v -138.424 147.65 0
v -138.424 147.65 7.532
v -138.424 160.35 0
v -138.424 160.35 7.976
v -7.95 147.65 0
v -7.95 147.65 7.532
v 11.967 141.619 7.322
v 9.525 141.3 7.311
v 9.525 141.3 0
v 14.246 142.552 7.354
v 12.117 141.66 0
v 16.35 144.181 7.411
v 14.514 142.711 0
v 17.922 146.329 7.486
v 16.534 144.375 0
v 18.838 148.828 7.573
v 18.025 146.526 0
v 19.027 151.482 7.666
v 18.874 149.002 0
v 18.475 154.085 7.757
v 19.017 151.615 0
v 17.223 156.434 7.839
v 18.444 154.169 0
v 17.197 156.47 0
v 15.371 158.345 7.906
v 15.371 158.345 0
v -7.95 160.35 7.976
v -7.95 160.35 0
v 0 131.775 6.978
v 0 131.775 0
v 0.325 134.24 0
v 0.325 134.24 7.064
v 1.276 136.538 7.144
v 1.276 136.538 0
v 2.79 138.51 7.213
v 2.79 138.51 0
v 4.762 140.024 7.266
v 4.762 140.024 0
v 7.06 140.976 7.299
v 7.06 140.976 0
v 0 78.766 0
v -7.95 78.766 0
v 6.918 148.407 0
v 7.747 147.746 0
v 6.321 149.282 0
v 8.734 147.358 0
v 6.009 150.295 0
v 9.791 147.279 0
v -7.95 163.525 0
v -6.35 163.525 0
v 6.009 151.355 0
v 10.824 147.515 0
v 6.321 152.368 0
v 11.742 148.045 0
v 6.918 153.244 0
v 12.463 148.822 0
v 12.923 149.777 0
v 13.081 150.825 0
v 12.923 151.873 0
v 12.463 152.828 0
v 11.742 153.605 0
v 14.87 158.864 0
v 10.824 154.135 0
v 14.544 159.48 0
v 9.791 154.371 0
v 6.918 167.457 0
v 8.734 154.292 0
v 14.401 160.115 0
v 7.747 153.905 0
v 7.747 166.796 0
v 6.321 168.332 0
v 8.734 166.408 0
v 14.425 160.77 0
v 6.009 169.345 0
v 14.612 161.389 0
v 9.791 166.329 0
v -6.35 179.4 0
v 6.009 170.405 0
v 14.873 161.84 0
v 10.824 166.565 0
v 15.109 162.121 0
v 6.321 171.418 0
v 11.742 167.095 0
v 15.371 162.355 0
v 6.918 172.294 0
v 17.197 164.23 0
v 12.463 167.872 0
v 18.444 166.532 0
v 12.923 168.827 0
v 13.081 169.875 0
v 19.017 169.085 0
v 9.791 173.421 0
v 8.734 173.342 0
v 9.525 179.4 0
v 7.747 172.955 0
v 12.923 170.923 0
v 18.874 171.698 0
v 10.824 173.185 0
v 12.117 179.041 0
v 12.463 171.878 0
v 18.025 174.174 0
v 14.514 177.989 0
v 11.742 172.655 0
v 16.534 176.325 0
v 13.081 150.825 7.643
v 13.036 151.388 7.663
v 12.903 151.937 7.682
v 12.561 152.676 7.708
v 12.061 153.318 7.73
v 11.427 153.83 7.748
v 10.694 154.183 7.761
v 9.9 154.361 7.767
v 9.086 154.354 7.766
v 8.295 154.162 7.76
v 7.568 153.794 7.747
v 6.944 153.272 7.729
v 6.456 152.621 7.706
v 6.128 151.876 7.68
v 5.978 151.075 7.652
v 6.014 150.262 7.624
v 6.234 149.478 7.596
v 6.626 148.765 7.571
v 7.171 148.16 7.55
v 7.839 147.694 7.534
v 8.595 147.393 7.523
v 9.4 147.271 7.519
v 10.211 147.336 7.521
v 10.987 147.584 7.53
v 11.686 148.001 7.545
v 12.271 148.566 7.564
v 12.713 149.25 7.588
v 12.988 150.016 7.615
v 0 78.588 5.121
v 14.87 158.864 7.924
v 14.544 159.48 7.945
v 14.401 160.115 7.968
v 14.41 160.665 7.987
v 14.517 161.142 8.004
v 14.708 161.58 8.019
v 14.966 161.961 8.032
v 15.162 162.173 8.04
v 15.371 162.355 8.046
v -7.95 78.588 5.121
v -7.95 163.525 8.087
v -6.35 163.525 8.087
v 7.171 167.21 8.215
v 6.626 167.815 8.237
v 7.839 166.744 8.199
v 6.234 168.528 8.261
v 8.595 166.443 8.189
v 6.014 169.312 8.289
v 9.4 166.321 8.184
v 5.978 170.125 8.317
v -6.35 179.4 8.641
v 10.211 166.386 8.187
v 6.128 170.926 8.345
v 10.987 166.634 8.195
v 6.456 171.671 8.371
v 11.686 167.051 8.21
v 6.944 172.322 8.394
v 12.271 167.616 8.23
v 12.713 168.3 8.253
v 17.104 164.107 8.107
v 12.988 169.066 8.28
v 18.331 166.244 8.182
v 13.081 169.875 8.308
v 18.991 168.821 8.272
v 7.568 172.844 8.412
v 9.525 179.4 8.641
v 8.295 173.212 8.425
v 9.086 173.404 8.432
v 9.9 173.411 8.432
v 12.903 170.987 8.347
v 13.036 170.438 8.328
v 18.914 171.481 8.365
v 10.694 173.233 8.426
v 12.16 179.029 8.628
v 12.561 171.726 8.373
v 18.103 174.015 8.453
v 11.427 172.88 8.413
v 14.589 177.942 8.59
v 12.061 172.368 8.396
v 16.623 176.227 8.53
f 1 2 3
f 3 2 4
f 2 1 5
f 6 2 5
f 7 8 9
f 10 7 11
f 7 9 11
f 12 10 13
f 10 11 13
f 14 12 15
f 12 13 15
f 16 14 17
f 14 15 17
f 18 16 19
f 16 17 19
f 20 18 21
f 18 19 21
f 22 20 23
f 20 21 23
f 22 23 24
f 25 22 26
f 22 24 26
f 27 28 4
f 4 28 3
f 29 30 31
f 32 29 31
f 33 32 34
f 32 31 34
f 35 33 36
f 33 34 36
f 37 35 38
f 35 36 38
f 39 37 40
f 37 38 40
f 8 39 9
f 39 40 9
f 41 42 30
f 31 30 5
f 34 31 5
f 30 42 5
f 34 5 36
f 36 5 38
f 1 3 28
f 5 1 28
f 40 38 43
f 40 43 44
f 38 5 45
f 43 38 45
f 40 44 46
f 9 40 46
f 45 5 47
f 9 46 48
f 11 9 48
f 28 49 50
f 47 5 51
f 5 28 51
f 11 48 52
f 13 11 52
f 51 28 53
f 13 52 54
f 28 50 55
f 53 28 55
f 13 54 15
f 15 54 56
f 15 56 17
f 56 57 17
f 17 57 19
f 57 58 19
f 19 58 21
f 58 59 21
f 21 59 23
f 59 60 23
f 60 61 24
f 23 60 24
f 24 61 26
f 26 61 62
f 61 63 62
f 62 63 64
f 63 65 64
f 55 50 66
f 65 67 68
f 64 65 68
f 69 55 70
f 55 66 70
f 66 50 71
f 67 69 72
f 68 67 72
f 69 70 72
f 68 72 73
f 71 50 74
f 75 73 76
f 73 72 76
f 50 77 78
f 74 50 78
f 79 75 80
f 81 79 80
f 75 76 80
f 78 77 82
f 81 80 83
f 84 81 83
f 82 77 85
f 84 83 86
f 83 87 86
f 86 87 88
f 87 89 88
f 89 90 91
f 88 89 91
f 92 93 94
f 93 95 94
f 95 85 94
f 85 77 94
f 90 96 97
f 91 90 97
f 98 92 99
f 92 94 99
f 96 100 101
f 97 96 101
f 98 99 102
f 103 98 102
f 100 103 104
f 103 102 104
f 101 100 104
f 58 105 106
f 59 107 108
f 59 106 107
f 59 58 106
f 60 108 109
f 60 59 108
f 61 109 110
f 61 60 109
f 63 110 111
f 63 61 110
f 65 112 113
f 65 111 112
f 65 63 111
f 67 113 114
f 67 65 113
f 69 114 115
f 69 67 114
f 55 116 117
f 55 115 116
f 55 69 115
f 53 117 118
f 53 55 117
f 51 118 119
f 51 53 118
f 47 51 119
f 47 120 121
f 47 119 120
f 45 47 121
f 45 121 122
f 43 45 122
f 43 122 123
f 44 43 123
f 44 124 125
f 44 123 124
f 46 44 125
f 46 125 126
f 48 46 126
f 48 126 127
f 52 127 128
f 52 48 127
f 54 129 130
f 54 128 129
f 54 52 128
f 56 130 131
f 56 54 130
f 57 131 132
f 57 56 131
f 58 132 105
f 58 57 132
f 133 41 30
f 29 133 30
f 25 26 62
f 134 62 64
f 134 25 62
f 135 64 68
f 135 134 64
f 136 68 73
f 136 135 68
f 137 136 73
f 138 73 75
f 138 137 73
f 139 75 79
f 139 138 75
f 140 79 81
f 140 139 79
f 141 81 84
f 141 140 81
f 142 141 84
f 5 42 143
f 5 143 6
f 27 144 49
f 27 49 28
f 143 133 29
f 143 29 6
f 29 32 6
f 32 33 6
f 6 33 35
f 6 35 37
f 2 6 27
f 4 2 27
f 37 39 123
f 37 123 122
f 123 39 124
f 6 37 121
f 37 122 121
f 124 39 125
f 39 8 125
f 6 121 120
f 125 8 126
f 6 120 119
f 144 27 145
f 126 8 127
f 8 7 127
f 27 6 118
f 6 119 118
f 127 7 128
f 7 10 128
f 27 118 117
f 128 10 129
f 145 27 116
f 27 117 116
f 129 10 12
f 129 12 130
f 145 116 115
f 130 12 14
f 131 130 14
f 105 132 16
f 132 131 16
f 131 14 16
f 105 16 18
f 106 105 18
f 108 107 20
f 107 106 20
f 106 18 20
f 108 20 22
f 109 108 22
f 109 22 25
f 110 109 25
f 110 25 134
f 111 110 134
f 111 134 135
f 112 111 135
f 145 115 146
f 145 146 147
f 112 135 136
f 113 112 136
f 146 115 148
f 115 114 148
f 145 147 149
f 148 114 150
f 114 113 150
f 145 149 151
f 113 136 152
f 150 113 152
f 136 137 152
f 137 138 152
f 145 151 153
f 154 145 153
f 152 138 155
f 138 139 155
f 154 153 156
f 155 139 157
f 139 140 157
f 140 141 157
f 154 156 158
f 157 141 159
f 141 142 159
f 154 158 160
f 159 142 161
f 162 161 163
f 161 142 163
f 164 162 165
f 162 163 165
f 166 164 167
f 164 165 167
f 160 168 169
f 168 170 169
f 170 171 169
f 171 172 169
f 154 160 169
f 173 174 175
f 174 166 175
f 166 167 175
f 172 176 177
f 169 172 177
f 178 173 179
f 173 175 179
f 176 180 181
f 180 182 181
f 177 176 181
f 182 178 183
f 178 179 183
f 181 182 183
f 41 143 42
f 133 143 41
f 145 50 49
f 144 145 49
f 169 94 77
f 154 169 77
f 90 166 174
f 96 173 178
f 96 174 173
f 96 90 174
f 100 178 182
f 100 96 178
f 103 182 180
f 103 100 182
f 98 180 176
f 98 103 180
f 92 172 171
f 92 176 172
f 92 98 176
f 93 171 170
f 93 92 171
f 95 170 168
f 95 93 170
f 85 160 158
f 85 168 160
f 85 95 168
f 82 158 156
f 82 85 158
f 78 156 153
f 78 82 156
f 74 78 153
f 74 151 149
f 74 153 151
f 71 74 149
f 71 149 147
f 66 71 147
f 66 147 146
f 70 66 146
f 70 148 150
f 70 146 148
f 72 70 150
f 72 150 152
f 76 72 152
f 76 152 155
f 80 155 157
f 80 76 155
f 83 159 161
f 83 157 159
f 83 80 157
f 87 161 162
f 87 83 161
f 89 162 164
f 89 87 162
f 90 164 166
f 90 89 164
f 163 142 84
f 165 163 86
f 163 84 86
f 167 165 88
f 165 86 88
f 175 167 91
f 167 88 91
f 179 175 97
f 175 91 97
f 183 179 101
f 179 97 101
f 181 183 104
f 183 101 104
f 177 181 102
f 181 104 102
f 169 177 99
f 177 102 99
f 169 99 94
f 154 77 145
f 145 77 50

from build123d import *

# Parameters (mm, degrees)
BOSS_EXTRUDE1_OUTLINE_R = 3.556
BOSS_EXTRUDE1_OUTLINE_W = 260.9469
BOSS_EXTRUDE1_OUTLINE_H = 138.1252
BOSS_EXTRUDE1_DEPTH     = 76.2
CUT_EXTRUDE1_DEPTH      = 355.32482824
CUT_EXTRUDE1_DEPTH_BACK = 355.32482824
FILLET1_R               = 2.54
SKETCH7_W               = 260.9469
SKETCH7_H               = 22.1996
CUT_EXTRUDE2_DEPTH      = 347.152897849
FILLET2_R               = 6.35
SKETCH8_W               = 190.775627824
SKETCH8_H               = 235.521960295
CUT_EXTRUDE4_DEPTH      = 347.144751077
SKETCH9_W               = 165.75862987
SKETCH9_H               = 108.368614936
CUT_EXTRUDE5_DEPTH      = 227.747805823


# Read off the part's stored shape, not the designer's step: Boss-Extrude1
with BuildPart() as part:
    # Boss-Extrude1 outline → Boss-Extrude1 (new body)
    with BuildSketch(Plane.XY):
        with BuildLine():
            Line((-286.3596, -22.225), (9.525, -22.225))
            ThreePointArc((9.525, -22.225), (19.05, -12.7), (9.525, -3.175))
            ThreePointArc((9.525, -3.175), (19.05, 6.35), (9.525, 15.875))
            ThreePointArc((9.525, 15.875), (2.789807909, 18.664807909), (0, 25.4))
            Line((0, 25.4), (0, 131.7752))
            ThreePointArc((0, 131.7752), (2.789807909, 138.510392091), (9.525, 141.3002))
            ThreePointArc((9.525, 141.3002), (19.05, 150.8252), (9.525, 160.3502))
            ThreePointArc((9.525, 160.3502), (19.05, 169.8752), (9.525, 179.4002))
            Line((9.525, 179.4002), (-6.35, 179.4002))
            Line((-6.35, 179.4002), (-6.35, 163.5252))
            Line((-6.35, 163.5252), (-7.9502, 163.5252))
            Line((-7.9502, 163.5252), (-7.9502, 160.3502))
            Line((-7.9502, 160.3502), (-268.9098, 160.3502))
            Line((-268.9098, 160.3502), (-268.9098, 163.5252))
            Line((-268.9098, 163.5252), (-270.51, 163.5252))
            Line((-270.51, 163.5252), (-270.51, 179.4002))
            Line((-270.51, 179.4002), (-286.385, 179.4002))
            ThreePointArc((-286.385, 179.4002), (-295.91, 169.8752), (-286.385, 160.3502))
            ThreePointArc((-286.385, 160.3502), (-295.897297883, 150.818850004), (-286.3723, 141.3002))
            ThreePointArc((-286.3723, 141.3002), (-279.637107909, 138.510392091), (-276.8473, 131.7752))
            Line((-276.8473, 131.7752), (-276.8473, 25.4))
            ThreePointArc((-276.8473, 25.4), (-279.637107909, 18.664807909), (-286.3723, 15.875))
            ThreePointArc((-286.3723, 15.875), (-295.8973, 6.35), (-286.3723, -3.175))
            ThreePointArc((-286.3723, -3.175), (-295.884597883, -12.706349996), (-286.3596, -22.225))
        make_face()
        with Locations((-286.3596, -12.7)):
            Circle(BOSS_EXTRUDE1_OUTLINE_R, mode=Mode.SUBTRACT)
        with Locations((-286.3723, 6.35)):
            Circle(BOSS_EXTRUDE1_OUTLINE_R, mode=Mode.SUBTRACT)
        with Locations((9.525, -12.7)):
            Circle(BOSS_EXTRUDE1_OUTLINE_R, mode=Mode.SUBTRACT)
        with Locations((9.525, 6.35)):
            Circle(BOSS_EXTRUDE1_OUTLINE_R, mode=Mode.SUBTRACT)
        with Locations((-286.3723, 150.8252)):
            Circle(BOSS_EXTRUDE1_OUTLINE_R, mode=Mode.SUBTRACT)
        with Locations((-286.385, 169.8752)):
            Circle(BOSS_EXTRUDE1_OUTLINE_R, mode=Mode.SUBTRACT)
        with Locations((-138.42365, 78.5876)):
            Rectangle(BOSS_EXTRUDE1_OUTLINE_W, BOSS_EXTRUDE1_OUTLINE_H, mode=Mode.SUBTRACT)
        with Locations((9.525, 150.8252)):
            Circle(BOSS_EXTRUDE1_OUTLINE_R, mode=Mode.SUBTRACT)
        with Locations((9.525, 169.8752)):
            Circle(BOSS_EXTRUDE1_OUTLINE_R, mode=Mode.SUBTRACT)
    extrude(amount=BOSS_EXTRUDE1_DEPTH)

    # Sketch5 → Cut-Extrude1 (cut, two sides: drawn at the far end of the back side and taken through both)
    with BuildSketch(Plane.ZY.offset(276.8473).offset(-CUT_EXTRUDE1_DEPTH_BACK)):
        Polygon((1.6002, -22.225), (8.641107133, 179.4002), (76.2, 179.4002), (76.2, -22.225), align=None)
    extrude(amount=CUT_EXTRUDE1_DEPTH + CUT_EXTRUDE1_DEPTH_BACK, mode=Mode.SUBTRACT)

    # Fillet1
    fillet1_edges = [part.edges().sort_by_distance(p)[0] for p in [
        (-286.385, 160.3502, 3.987933237),
        (-286.3723, -3.175, 1.132720329),
        (9.525, -3.175, 1.132720329),
        (9.525, 160.3502, 3.987933237),
    ]]
    fillet(fillet1_edges, radius=FILLET1_R)

    # Sketch7 → Cut-Extrude2 (cut, through all)
    with BuildSketch(Plane(origin=(0, 0, 0), x_dir=(-1, 0, 0), z_dir=(0, 0, -1))):
        with Locations((138.42365, -6.35)):
            Rectangle(SKETCH7_W, SKETCH7_H)
    extrude(amount=-CUT_EXTRUDE2_DEPTH, mode=Mode.SUBTRACT)

    # Fillet2
    fillet2_edges = [part.edges().sort_by_distance(p)[0] for p in [
        (-268.8971, 4.7498, 1.271090386),
        (-268.8971, -17.4498, 0.883476829),
        (-7.9502, -17.4498, 0.883476829),
        (-7.9502, 4.7498, 1.271090386),
    ]]
    fillet(fillet2_edges, radius=FILLET2_R)

    # Sketch8 → Cut-Extrude4 (cut, through all)
    with BuildSketch(Plane(origin=(0, -0.082881646, 2.373419811), x_dir=(1, 0, 0), z_dir=(0, -0.03489949670250444, 0.9993908270190958))):
        with Locations((-233.811463912, 74.917246318)):
            Rectangle(SKETCH8_W, SKETCH8_H)
    extrude(amount=-CUT_EXTRUDE4_DEPTH, mode=Mode.SUBTRACT)

    # Sketch9 → Cut-Extrude5 (cut, through all)
    with BuildSketch(Plane(origin=(0, -0.082881646, 2.373419811), x_dir=(1, 0, 0), z_dir=(0, -0.03489949670250444, 0.9993908270190958))):
        with Locations((-55.544335065, 24.534127322)):
            Rectangle(SKETCH9_W, SKETCH9_H)
    extrude(amount=-CUT_EXTRUDE5_DEPTH, mode=Mode.SUBTRACT)


solid = part.part
